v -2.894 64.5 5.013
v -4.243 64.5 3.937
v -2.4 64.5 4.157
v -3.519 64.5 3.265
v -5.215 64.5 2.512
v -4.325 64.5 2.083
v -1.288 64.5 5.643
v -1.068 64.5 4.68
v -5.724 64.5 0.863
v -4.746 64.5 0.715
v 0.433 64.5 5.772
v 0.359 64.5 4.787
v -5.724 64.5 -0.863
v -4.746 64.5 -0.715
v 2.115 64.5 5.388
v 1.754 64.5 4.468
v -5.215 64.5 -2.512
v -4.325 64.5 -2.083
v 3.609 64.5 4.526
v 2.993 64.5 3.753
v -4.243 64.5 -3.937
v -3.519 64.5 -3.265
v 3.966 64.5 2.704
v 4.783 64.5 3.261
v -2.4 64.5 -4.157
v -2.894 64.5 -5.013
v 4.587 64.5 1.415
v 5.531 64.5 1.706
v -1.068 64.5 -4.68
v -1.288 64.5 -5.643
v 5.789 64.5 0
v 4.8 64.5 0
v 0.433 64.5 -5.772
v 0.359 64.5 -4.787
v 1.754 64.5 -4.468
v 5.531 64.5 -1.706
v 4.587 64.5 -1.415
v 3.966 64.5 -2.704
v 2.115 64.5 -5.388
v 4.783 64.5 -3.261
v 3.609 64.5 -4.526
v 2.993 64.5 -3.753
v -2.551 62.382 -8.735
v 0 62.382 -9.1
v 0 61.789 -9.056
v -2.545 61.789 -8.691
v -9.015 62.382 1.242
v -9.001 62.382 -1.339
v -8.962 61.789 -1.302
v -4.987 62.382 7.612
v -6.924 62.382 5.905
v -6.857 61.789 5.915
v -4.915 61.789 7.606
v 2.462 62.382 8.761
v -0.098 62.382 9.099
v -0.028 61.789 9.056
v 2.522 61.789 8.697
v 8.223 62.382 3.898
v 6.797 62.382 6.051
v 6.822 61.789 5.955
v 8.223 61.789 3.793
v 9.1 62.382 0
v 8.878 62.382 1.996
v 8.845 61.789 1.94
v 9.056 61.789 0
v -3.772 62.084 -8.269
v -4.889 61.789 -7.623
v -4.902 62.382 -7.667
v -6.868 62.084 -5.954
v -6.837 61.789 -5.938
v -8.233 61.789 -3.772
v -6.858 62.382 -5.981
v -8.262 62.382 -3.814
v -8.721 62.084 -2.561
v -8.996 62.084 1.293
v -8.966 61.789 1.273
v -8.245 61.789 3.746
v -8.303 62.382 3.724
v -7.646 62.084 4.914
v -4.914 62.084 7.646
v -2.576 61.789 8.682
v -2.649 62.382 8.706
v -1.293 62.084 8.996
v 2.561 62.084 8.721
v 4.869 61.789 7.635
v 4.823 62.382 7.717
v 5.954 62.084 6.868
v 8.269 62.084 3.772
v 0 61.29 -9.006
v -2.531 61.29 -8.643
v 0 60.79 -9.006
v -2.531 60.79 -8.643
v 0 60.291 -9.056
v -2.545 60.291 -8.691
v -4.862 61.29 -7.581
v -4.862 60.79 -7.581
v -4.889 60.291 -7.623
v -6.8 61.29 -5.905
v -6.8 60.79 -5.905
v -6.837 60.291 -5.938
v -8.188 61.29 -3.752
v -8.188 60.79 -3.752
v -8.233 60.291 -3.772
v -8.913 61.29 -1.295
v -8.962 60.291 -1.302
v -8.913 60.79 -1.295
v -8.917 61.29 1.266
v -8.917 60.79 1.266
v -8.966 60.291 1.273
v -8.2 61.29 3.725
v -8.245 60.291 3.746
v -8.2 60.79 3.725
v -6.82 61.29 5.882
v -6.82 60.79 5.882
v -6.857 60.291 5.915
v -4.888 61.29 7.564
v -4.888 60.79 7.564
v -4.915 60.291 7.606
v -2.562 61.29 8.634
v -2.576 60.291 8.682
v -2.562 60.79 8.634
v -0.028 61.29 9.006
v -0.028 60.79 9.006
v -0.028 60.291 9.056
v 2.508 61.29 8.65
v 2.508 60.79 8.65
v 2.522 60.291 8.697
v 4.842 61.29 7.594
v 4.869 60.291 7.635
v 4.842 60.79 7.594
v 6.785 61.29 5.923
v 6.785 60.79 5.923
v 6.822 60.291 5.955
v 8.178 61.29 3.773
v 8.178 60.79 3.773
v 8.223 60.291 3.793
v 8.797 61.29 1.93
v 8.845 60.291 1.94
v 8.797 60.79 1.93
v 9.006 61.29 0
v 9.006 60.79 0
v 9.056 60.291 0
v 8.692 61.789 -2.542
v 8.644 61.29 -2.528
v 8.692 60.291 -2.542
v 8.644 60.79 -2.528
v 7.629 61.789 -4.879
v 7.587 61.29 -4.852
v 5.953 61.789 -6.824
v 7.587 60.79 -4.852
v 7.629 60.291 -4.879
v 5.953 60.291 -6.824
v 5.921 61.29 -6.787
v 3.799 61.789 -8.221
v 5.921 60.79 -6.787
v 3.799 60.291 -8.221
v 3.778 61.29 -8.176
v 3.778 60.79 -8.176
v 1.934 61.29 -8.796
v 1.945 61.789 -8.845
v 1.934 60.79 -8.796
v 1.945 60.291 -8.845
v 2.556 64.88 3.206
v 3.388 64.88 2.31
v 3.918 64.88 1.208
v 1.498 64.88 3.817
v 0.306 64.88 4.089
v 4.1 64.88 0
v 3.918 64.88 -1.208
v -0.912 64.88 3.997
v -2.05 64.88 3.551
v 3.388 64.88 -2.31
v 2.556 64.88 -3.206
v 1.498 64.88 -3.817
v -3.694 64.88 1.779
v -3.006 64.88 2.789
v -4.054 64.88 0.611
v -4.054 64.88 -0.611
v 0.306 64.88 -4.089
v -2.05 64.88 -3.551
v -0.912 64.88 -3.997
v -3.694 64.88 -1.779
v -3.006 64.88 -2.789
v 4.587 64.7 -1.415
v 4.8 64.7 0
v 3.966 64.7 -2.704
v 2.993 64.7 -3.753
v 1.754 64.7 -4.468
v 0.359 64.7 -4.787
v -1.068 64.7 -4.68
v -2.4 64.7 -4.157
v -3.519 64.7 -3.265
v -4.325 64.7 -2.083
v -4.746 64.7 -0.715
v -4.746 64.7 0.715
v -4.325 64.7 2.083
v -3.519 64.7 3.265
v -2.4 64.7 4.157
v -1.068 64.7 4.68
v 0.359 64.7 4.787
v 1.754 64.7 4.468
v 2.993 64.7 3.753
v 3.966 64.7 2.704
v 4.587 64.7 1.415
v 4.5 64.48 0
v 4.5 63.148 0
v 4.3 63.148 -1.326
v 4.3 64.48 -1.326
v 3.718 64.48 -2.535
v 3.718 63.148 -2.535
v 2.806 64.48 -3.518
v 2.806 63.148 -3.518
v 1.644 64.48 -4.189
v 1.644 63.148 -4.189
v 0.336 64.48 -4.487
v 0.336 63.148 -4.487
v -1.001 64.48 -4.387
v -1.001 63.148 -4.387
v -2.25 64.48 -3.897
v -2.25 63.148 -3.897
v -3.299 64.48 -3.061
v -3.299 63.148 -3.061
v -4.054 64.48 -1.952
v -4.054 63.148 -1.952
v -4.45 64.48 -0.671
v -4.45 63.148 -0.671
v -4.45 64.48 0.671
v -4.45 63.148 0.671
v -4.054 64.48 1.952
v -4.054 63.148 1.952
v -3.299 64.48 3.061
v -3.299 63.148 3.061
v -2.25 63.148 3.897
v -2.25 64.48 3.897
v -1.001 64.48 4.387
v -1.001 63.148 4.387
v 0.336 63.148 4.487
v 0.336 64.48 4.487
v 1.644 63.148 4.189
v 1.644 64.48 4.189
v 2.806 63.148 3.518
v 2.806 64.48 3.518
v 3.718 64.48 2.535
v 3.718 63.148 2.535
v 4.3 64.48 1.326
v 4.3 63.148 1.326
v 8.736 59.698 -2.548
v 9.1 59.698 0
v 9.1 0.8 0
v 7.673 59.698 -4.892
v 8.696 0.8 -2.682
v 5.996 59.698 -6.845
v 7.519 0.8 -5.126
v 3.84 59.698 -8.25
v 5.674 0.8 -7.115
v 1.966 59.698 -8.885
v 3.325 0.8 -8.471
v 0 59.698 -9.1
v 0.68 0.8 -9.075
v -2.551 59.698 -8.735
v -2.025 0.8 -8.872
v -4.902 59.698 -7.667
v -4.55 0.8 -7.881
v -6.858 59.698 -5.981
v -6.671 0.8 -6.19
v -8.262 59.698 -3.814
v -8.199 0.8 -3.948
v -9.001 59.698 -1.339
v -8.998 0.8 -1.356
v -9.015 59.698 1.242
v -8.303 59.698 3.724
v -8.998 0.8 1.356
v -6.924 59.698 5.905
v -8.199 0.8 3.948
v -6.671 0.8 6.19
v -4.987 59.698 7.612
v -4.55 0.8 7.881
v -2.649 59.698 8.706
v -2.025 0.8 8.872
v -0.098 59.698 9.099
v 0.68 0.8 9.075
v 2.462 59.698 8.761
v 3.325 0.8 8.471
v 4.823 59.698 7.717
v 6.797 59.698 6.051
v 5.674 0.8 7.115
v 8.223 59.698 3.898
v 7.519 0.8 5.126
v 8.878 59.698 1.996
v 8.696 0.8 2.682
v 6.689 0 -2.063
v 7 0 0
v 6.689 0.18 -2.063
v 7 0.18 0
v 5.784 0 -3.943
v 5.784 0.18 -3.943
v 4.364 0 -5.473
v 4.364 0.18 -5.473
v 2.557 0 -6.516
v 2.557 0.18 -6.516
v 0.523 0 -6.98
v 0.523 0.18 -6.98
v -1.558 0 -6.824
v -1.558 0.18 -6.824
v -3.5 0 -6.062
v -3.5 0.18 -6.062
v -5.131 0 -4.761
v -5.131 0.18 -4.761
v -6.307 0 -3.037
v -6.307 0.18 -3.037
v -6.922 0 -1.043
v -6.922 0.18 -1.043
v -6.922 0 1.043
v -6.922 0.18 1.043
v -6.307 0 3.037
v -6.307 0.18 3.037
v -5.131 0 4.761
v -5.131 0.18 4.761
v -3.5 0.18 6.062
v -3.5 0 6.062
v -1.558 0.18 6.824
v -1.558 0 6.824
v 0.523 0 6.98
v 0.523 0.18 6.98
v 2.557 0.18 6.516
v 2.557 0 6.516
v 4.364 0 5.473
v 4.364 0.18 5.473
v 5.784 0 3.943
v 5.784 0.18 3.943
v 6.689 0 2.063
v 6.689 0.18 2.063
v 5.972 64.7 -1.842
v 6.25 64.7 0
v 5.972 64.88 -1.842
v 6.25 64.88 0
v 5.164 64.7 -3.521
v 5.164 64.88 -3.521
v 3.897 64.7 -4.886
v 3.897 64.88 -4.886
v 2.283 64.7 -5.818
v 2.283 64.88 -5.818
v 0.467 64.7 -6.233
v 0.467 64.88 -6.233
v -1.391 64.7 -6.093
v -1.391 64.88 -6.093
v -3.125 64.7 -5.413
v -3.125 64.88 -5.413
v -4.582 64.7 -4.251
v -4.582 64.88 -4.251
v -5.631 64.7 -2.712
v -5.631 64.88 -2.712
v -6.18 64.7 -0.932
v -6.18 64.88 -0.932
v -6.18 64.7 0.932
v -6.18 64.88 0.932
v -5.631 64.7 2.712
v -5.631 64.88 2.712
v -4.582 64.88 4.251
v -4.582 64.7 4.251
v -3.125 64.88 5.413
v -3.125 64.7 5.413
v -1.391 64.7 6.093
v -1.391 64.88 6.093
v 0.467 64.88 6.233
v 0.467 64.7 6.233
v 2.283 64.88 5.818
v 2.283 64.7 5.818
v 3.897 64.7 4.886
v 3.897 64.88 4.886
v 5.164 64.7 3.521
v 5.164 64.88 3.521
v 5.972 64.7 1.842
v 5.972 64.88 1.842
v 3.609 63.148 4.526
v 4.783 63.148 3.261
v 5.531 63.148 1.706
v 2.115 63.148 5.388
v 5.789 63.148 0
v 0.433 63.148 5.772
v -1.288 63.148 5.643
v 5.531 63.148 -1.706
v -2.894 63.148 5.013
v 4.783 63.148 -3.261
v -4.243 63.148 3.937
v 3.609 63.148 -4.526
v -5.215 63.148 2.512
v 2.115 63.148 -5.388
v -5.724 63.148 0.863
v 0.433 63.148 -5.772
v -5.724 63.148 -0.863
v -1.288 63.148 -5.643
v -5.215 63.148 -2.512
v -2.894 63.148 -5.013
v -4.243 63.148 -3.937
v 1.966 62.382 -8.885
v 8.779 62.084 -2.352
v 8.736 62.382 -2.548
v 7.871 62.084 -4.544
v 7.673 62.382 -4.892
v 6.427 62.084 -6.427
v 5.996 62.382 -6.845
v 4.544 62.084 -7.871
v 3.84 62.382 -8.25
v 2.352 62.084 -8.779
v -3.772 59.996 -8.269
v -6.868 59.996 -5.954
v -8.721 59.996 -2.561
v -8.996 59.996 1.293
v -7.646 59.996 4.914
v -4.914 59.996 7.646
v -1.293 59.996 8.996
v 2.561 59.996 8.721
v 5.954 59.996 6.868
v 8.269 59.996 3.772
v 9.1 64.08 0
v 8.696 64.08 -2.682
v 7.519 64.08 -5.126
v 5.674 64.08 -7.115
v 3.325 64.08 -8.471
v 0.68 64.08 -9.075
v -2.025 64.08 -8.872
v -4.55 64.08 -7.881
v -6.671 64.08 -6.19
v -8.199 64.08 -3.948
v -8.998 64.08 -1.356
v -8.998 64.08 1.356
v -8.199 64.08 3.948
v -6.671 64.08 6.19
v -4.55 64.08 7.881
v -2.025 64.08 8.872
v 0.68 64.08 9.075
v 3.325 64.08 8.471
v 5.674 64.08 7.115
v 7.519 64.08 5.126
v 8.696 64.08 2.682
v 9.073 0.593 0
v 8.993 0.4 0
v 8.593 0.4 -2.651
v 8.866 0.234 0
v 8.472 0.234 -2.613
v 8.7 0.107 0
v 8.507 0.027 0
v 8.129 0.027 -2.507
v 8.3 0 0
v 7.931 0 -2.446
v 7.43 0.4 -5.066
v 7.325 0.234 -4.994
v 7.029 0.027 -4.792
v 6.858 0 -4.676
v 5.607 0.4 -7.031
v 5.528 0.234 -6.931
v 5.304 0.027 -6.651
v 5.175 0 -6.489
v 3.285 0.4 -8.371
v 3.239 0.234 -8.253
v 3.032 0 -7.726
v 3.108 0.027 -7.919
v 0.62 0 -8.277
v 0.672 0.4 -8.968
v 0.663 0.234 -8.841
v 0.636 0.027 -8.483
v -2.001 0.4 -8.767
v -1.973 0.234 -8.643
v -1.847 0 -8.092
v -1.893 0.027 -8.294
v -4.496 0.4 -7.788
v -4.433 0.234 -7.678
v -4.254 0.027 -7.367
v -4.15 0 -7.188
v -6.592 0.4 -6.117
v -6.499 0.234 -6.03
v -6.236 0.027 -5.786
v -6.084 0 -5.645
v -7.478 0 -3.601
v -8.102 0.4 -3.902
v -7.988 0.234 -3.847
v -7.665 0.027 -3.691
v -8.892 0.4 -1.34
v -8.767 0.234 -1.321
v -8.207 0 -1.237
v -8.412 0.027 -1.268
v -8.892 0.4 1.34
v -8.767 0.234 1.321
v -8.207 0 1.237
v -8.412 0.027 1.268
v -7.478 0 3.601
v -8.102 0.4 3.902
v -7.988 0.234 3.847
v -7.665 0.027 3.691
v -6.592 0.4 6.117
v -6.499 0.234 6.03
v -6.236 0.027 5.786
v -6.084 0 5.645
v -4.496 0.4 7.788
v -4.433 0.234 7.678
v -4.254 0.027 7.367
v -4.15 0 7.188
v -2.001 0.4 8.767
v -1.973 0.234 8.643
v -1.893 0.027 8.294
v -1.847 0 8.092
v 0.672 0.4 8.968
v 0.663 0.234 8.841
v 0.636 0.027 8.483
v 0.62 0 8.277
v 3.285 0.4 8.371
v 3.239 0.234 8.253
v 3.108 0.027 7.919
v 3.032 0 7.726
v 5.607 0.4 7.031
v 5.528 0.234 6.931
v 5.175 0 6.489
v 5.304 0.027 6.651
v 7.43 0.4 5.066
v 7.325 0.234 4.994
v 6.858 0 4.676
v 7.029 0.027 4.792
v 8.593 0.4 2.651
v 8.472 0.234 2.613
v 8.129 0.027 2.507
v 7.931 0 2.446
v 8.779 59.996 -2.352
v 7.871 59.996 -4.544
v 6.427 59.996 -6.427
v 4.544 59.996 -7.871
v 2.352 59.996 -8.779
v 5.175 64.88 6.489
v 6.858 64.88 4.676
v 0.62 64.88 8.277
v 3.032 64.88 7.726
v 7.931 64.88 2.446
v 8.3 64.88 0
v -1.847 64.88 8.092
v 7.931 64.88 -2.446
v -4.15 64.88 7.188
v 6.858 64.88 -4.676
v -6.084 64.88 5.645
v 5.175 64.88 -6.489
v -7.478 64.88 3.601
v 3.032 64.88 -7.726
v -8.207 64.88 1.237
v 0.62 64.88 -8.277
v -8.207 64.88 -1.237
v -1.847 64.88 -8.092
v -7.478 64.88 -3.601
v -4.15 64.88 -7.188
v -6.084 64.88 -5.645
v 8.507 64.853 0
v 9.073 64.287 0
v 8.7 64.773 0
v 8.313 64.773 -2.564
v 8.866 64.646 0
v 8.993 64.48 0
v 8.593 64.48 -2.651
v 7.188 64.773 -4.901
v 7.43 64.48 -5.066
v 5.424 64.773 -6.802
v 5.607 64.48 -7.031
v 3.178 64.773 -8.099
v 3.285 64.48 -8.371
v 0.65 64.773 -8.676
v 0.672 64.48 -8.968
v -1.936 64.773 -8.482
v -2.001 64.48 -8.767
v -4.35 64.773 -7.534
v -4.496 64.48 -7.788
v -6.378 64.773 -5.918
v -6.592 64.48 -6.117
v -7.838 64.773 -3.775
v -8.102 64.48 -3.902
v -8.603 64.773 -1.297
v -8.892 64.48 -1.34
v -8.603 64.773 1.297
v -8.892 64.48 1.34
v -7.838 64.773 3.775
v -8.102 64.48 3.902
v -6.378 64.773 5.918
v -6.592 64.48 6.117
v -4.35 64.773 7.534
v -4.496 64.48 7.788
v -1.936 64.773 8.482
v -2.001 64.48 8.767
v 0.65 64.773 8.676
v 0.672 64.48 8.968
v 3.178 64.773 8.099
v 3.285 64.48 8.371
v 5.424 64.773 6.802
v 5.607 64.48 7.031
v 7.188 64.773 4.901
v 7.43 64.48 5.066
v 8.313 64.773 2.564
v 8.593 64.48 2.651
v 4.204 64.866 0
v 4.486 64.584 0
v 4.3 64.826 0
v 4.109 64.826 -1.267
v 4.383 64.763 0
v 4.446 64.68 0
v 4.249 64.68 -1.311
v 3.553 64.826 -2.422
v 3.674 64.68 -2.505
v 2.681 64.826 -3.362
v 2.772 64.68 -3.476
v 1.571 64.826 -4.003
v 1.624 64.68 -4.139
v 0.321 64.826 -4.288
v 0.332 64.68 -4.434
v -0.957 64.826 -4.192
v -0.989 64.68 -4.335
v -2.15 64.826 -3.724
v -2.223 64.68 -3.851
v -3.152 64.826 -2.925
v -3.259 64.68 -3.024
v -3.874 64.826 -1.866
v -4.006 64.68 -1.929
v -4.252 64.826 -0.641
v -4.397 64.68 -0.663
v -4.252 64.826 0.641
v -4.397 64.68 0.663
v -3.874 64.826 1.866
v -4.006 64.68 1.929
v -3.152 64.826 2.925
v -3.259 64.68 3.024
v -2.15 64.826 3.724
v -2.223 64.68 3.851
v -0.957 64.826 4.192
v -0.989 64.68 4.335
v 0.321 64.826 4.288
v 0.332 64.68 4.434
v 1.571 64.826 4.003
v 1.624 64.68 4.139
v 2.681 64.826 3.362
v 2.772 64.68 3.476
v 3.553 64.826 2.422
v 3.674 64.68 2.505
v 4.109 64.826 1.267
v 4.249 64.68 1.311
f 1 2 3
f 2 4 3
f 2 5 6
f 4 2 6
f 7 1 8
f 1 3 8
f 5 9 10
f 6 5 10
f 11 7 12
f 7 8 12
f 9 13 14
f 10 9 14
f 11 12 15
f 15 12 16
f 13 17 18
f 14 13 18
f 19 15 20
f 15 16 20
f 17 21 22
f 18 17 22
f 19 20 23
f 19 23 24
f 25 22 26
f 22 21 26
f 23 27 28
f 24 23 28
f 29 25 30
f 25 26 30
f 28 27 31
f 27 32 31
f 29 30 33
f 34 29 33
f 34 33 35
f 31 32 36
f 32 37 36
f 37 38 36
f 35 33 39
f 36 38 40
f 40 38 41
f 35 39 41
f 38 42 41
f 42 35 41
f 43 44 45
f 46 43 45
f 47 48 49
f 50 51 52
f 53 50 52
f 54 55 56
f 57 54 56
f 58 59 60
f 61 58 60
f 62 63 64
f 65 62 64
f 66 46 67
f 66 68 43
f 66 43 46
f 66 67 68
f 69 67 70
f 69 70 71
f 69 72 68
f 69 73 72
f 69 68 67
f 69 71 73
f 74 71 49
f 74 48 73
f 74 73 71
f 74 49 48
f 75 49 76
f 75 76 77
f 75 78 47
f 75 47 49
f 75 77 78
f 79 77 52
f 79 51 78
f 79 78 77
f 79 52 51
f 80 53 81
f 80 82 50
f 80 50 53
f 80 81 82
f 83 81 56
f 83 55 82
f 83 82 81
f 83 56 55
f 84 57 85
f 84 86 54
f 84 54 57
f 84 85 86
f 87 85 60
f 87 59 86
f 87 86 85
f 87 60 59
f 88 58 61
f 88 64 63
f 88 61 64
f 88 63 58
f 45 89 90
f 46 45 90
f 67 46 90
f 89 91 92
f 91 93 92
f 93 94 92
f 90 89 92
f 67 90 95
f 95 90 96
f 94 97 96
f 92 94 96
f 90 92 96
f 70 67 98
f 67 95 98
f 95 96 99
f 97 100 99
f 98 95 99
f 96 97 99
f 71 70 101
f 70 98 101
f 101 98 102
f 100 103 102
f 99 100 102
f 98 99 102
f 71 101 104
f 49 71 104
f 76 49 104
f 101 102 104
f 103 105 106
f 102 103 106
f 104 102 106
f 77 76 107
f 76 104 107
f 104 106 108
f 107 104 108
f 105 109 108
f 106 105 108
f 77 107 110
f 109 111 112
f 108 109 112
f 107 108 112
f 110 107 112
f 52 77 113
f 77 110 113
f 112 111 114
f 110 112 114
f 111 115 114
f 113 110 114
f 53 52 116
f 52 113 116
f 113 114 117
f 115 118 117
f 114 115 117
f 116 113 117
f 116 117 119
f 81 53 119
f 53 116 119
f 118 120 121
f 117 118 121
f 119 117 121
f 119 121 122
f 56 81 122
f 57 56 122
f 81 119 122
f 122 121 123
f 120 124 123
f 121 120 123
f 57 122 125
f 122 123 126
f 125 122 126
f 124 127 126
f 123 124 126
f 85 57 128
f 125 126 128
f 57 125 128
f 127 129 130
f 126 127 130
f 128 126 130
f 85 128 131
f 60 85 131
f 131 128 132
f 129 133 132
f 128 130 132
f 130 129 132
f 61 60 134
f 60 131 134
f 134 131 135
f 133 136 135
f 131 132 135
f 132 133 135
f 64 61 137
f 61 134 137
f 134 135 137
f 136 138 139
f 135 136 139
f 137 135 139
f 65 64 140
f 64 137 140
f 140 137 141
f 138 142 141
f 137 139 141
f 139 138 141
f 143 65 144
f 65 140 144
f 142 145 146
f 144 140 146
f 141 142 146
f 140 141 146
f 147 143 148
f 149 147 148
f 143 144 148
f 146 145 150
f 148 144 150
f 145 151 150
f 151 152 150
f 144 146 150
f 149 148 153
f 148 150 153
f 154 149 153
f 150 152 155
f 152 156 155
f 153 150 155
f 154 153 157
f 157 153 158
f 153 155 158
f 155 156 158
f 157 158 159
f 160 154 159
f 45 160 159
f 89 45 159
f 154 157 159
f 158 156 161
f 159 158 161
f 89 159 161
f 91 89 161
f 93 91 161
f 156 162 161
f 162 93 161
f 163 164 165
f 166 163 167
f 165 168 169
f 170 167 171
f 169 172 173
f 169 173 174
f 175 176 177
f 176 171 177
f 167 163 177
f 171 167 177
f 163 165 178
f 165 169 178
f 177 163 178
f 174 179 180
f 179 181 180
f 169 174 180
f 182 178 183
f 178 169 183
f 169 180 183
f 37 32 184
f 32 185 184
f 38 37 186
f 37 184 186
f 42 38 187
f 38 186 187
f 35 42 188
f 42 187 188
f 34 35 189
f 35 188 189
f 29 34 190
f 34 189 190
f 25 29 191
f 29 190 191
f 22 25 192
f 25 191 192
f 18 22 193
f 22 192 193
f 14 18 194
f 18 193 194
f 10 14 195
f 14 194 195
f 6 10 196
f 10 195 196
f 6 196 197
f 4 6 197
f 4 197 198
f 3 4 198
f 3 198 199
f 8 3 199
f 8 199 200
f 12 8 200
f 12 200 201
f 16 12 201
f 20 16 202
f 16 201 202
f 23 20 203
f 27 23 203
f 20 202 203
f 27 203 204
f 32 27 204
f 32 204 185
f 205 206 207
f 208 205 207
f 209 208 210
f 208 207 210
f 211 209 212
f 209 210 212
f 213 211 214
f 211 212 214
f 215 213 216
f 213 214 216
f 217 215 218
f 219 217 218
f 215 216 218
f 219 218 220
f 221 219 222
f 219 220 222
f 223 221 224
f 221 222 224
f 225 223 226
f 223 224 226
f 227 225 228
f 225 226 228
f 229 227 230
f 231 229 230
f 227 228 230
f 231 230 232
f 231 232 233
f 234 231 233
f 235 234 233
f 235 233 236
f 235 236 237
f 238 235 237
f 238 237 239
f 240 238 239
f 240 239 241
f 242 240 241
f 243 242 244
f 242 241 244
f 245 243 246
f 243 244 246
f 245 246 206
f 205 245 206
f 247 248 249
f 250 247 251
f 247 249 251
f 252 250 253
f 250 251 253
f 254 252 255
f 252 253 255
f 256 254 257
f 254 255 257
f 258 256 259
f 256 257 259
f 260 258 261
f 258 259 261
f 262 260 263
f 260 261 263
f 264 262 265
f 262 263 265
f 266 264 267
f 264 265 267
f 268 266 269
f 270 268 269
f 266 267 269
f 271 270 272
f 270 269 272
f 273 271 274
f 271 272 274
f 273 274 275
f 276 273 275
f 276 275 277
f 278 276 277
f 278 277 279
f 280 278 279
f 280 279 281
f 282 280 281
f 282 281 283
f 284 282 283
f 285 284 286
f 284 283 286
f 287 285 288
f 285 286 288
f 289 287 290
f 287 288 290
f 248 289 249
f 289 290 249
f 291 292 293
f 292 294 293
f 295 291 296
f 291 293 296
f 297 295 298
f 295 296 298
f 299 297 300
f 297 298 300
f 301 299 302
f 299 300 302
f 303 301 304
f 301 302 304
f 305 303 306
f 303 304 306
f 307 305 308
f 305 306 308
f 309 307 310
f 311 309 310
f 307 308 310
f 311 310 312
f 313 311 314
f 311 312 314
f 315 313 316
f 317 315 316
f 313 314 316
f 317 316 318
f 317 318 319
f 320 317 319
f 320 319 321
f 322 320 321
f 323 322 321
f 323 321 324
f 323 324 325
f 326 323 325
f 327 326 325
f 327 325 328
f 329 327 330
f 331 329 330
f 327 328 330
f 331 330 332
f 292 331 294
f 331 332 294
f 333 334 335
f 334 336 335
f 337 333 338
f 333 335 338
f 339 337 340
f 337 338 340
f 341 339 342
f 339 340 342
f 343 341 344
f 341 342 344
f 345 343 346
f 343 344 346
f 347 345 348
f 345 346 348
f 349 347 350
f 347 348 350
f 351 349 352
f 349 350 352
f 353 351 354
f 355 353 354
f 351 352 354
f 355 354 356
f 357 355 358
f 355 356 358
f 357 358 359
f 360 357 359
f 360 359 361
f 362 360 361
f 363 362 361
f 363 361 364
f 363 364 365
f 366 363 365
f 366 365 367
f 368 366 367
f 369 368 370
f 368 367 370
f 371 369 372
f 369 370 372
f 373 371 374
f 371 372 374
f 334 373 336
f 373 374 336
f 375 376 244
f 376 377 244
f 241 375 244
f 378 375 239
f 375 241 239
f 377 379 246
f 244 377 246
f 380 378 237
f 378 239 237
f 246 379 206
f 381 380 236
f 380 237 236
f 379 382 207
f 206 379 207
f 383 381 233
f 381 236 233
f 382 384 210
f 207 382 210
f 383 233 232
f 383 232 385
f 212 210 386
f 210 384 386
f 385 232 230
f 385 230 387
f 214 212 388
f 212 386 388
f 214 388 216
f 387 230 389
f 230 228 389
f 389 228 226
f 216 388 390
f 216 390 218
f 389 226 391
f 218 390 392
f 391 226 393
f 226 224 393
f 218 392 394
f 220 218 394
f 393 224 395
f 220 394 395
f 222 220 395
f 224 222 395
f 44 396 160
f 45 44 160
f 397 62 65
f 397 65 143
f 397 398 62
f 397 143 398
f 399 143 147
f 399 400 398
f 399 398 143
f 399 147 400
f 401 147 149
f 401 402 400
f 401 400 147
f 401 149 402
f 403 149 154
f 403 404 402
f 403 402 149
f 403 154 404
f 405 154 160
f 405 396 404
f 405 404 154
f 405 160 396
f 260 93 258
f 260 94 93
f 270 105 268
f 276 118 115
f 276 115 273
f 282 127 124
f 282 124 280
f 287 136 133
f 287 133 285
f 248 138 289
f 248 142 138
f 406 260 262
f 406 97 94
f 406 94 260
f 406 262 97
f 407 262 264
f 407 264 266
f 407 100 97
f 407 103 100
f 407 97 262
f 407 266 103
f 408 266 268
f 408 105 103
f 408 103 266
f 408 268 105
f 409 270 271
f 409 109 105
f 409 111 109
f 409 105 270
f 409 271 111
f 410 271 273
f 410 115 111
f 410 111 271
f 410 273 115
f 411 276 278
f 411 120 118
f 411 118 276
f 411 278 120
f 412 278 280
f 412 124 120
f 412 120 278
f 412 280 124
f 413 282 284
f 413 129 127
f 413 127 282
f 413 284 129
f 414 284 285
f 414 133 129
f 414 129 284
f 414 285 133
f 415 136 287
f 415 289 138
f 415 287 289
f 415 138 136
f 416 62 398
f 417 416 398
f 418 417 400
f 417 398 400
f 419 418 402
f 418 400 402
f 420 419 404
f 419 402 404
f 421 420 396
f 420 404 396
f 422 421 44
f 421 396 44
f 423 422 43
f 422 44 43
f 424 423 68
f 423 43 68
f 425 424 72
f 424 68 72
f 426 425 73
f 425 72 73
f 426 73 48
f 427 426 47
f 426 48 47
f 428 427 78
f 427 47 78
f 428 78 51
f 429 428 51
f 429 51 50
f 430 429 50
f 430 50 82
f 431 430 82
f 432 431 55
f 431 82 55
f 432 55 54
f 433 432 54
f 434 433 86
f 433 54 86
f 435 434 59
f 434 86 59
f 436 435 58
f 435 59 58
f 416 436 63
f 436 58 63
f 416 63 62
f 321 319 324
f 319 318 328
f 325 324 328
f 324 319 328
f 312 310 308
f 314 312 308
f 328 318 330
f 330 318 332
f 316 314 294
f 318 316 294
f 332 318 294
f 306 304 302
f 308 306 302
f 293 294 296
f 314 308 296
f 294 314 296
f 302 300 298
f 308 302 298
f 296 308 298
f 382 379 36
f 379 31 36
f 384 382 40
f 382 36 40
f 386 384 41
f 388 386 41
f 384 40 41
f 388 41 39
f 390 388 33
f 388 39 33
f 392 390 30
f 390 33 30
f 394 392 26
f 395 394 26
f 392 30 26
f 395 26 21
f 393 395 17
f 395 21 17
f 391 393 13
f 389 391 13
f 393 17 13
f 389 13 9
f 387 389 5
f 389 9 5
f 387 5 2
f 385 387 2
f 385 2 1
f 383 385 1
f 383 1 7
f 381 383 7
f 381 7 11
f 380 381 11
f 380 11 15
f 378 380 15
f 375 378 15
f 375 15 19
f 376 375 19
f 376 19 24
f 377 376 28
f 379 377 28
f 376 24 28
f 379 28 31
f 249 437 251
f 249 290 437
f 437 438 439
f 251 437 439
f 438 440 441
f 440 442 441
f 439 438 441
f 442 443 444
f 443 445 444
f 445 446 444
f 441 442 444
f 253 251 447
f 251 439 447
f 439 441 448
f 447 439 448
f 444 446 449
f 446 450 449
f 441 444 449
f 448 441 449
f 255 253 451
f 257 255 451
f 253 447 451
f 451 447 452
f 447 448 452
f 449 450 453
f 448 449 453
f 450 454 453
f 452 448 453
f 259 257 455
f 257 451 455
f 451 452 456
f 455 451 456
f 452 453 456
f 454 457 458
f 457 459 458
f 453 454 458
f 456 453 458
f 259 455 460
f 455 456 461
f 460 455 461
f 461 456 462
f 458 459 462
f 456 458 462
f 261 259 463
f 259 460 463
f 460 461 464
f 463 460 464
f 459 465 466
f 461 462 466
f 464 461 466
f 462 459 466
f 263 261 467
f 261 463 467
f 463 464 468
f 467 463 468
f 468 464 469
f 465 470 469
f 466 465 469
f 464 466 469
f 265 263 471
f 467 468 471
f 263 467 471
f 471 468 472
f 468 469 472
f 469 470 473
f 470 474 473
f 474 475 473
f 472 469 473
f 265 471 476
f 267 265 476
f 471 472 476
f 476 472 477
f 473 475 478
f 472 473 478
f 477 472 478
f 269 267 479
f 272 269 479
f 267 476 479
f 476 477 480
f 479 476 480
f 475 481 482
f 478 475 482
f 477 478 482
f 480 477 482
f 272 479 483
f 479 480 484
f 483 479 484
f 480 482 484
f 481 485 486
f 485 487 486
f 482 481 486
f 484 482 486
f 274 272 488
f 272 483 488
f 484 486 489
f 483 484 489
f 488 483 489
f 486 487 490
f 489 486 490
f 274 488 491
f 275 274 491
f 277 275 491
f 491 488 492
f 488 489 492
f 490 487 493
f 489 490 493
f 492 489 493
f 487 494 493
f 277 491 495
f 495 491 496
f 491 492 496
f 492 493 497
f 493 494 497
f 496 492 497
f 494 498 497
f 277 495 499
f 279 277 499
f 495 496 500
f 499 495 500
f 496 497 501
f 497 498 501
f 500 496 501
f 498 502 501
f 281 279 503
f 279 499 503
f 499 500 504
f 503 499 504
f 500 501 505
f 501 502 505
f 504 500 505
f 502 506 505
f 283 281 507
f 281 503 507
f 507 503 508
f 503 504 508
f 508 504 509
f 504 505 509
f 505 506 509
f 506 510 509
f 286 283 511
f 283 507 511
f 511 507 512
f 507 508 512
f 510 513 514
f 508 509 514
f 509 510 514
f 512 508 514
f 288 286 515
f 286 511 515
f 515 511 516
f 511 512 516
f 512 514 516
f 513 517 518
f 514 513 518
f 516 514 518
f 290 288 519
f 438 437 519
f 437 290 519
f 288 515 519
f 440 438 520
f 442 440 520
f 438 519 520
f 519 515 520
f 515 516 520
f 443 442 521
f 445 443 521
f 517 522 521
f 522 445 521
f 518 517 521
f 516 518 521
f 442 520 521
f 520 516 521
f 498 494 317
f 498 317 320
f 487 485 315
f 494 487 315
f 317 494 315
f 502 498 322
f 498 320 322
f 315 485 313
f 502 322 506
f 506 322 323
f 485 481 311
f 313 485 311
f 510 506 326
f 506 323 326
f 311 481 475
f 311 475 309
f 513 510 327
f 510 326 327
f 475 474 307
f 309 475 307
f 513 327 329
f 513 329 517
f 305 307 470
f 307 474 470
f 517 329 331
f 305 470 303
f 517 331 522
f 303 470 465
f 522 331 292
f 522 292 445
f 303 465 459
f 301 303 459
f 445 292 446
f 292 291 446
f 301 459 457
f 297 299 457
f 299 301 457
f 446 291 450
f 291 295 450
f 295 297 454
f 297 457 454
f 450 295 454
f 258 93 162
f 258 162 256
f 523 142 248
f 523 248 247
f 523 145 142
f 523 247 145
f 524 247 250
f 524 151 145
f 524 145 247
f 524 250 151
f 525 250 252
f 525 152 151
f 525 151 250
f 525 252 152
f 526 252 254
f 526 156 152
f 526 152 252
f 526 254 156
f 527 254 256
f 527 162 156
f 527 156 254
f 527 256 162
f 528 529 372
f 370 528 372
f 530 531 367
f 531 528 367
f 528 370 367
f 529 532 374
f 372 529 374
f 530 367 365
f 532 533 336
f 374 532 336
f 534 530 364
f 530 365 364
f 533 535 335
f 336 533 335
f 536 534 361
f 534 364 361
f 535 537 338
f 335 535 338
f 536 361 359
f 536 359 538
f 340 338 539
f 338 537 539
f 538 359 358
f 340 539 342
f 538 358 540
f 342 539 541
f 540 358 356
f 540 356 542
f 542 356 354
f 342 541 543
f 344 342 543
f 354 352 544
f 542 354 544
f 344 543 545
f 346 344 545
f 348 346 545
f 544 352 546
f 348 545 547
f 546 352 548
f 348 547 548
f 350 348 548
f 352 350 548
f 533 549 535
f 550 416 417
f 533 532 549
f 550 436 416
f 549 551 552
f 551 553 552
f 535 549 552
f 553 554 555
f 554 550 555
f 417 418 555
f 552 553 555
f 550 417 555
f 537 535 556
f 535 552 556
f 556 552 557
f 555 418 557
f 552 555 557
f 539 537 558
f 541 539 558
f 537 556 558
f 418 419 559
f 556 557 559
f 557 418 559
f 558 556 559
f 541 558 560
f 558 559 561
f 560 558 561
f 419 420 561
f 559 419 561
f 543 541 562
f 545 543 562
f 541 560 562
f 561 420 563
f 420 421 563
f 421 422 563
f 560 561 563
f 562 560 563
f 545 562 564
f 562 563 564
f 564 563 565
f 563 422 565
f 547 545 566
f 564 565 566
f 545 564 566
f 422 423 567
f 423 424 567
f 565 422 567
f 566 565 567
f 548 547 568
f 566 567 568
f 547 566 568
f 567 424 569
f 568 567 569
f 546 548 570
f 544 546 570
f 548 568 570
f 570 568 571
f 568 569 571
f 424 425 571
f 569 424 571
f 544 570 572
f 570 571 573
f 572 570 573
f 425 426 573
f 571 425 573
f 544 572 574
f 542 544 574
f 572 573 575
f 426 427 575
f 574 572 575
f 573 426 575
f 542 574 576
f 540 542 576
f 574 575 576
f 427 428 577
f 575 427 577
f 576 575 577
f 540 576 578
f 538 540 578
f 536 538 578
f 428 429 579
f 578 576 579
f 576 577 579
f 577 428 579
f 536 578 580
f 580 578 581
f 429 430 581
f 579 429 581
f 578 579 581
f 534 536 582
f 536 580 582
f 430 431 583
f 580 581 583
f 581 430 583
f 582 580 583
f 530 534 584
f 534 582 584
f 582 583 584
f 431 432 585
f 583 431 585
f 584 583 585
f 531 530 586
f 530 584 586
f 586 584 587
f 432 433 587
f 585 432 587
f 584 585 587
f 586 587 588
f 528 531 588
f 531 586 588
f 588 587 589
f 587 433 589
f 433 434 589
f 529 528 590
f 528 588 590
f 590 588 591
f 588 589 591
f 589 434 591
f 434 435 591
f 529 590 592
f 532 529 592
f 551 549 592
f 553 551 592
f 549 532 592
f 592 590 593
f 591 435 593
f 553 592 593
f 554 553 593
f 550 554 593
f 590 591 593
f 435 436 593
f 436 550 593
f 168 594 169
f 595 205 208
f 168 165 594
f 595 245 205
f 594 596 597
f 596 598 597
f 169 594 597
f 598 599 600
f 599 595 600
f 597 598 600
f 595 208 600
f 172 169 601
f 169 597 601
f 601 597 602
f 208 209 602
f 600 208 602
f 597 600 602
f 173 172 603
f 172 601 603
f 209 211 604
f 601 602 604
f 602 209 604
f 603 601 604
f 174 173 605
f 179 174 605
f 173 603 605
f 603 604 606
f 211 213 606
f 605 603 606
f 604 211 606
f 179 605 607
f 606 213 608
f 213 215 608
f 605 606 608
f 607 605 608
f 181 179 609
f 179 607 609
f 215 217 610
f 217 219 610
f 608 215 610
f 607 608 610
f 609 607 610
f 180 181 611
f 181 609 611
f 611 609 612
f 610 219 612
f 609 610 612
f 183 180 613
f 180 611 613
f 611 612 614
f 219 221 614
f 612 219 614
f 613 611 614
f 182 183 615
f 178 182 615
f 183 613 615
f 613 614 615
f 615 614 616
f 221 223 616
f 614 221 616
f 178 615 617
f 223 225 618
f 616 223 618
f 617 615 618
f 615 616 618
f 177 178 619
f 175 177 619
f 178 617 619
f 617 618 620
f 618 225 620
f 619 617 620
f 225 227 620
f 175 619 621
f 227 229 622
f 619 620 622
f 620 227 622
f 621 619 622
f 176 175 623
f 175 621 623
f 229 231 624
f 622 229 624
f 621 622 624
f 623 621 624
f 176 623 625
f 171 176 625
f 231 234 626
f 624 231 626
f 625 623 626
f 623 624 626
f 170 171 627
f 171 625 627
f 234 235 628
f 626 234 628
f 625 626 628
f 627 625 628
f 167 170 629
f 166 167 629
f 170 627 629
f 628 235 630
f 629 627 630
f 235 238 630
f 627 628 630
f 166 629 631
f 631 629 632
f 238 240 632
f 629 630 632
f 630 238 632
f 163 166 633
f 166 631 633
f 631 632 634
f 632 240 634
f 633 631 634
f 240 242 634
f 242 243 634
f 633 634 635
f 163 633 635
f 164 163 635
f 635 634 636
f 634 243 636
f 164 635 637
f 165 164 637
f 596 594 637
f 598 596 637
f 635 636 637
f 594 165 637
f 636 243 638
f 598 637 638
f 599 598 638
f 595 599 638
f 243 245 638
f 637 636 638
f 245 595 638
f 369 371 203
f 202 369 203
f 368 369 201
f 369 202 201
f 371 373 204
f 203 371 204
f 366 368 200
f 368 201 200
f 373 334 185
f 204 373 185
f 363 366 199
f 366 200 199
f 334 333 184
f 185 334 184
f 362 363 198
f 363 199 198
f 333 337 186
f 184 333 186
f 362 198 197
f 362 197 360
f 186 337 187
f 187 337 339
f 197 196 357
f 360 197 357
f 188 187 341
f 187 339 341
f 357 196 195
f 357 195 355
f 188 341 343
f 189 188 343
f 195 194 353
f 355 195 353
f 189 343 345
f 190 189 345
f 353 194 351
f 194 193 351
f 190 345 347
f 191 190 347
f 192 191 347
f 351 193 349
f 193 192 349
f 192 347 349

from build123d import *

# Parameters (mm, degrees)
CONG_1_R    = 0.4
CONG_2_R    = 0.8
ESQUISSE2_R = 5.05
CONG_3_R    = 4


with BuildPart() as part:
    # Esquisse1 → Révolution1 (revolve)
    with BuildSketch(Plane.XY):
        Polygon((0, 64.88), (4.5, 64.88), (4.5, 63.147633926), (5.788540515, 63.147633926), (5.788540515, 64.5), (4.8, 64.5), (4.8, 64.7), (6.25, 64.7), (6.25, 64.88), (9.1, 64.88), (9.1, 0), (7, 0), (7, 0.18), (0, 0.18), align=None)
    revolve(axis=Axis((0, 0, 0), (0, 1, 0)))

    # Congé1
    cong_1_edges = [part.edges().sort_by_distance(p)[0] for p in [
        (-4.5, 64.88, 0),
    ]]
    fillet(cong_1_edges, radius=CONG_1_R)

    # Congé2
    cong_2_edges = [part.edges().sort_by_distance(p)[0] for p in [
        (-9.1, 0, 0),
        (-9.1, 64.88, 0),
    ]]
    fillet(cong_2_edges, radius=CONG_2_R)

    # Esquisse2 → Enlèvement de matière-Révolution1 (revolve, cut)
    with BuildSketch(Plane(origin=(0, 0, 0), x_dir=(0, 0, -1), z_dir=(1, 0, 0))):
        with Locations((14.05, 61.04)):
            Circle(ESQUISSE2_R)
    revolve(axis=Axis((0, 52.453065443, 0), (0, 1, 0)), mode=Mode.SUBTRACT)

    # Congé3
    cong_3_edges = [part.edges().sort_by_distance(p)[0] for p in [
        (6.434671709, 62.04, -6.434671709),
        (-6.434671709, 60.04, 6.434671709),
    ]]
    fillet(cong_3_edges, radius=CONG_3_R)


solid = part.part
